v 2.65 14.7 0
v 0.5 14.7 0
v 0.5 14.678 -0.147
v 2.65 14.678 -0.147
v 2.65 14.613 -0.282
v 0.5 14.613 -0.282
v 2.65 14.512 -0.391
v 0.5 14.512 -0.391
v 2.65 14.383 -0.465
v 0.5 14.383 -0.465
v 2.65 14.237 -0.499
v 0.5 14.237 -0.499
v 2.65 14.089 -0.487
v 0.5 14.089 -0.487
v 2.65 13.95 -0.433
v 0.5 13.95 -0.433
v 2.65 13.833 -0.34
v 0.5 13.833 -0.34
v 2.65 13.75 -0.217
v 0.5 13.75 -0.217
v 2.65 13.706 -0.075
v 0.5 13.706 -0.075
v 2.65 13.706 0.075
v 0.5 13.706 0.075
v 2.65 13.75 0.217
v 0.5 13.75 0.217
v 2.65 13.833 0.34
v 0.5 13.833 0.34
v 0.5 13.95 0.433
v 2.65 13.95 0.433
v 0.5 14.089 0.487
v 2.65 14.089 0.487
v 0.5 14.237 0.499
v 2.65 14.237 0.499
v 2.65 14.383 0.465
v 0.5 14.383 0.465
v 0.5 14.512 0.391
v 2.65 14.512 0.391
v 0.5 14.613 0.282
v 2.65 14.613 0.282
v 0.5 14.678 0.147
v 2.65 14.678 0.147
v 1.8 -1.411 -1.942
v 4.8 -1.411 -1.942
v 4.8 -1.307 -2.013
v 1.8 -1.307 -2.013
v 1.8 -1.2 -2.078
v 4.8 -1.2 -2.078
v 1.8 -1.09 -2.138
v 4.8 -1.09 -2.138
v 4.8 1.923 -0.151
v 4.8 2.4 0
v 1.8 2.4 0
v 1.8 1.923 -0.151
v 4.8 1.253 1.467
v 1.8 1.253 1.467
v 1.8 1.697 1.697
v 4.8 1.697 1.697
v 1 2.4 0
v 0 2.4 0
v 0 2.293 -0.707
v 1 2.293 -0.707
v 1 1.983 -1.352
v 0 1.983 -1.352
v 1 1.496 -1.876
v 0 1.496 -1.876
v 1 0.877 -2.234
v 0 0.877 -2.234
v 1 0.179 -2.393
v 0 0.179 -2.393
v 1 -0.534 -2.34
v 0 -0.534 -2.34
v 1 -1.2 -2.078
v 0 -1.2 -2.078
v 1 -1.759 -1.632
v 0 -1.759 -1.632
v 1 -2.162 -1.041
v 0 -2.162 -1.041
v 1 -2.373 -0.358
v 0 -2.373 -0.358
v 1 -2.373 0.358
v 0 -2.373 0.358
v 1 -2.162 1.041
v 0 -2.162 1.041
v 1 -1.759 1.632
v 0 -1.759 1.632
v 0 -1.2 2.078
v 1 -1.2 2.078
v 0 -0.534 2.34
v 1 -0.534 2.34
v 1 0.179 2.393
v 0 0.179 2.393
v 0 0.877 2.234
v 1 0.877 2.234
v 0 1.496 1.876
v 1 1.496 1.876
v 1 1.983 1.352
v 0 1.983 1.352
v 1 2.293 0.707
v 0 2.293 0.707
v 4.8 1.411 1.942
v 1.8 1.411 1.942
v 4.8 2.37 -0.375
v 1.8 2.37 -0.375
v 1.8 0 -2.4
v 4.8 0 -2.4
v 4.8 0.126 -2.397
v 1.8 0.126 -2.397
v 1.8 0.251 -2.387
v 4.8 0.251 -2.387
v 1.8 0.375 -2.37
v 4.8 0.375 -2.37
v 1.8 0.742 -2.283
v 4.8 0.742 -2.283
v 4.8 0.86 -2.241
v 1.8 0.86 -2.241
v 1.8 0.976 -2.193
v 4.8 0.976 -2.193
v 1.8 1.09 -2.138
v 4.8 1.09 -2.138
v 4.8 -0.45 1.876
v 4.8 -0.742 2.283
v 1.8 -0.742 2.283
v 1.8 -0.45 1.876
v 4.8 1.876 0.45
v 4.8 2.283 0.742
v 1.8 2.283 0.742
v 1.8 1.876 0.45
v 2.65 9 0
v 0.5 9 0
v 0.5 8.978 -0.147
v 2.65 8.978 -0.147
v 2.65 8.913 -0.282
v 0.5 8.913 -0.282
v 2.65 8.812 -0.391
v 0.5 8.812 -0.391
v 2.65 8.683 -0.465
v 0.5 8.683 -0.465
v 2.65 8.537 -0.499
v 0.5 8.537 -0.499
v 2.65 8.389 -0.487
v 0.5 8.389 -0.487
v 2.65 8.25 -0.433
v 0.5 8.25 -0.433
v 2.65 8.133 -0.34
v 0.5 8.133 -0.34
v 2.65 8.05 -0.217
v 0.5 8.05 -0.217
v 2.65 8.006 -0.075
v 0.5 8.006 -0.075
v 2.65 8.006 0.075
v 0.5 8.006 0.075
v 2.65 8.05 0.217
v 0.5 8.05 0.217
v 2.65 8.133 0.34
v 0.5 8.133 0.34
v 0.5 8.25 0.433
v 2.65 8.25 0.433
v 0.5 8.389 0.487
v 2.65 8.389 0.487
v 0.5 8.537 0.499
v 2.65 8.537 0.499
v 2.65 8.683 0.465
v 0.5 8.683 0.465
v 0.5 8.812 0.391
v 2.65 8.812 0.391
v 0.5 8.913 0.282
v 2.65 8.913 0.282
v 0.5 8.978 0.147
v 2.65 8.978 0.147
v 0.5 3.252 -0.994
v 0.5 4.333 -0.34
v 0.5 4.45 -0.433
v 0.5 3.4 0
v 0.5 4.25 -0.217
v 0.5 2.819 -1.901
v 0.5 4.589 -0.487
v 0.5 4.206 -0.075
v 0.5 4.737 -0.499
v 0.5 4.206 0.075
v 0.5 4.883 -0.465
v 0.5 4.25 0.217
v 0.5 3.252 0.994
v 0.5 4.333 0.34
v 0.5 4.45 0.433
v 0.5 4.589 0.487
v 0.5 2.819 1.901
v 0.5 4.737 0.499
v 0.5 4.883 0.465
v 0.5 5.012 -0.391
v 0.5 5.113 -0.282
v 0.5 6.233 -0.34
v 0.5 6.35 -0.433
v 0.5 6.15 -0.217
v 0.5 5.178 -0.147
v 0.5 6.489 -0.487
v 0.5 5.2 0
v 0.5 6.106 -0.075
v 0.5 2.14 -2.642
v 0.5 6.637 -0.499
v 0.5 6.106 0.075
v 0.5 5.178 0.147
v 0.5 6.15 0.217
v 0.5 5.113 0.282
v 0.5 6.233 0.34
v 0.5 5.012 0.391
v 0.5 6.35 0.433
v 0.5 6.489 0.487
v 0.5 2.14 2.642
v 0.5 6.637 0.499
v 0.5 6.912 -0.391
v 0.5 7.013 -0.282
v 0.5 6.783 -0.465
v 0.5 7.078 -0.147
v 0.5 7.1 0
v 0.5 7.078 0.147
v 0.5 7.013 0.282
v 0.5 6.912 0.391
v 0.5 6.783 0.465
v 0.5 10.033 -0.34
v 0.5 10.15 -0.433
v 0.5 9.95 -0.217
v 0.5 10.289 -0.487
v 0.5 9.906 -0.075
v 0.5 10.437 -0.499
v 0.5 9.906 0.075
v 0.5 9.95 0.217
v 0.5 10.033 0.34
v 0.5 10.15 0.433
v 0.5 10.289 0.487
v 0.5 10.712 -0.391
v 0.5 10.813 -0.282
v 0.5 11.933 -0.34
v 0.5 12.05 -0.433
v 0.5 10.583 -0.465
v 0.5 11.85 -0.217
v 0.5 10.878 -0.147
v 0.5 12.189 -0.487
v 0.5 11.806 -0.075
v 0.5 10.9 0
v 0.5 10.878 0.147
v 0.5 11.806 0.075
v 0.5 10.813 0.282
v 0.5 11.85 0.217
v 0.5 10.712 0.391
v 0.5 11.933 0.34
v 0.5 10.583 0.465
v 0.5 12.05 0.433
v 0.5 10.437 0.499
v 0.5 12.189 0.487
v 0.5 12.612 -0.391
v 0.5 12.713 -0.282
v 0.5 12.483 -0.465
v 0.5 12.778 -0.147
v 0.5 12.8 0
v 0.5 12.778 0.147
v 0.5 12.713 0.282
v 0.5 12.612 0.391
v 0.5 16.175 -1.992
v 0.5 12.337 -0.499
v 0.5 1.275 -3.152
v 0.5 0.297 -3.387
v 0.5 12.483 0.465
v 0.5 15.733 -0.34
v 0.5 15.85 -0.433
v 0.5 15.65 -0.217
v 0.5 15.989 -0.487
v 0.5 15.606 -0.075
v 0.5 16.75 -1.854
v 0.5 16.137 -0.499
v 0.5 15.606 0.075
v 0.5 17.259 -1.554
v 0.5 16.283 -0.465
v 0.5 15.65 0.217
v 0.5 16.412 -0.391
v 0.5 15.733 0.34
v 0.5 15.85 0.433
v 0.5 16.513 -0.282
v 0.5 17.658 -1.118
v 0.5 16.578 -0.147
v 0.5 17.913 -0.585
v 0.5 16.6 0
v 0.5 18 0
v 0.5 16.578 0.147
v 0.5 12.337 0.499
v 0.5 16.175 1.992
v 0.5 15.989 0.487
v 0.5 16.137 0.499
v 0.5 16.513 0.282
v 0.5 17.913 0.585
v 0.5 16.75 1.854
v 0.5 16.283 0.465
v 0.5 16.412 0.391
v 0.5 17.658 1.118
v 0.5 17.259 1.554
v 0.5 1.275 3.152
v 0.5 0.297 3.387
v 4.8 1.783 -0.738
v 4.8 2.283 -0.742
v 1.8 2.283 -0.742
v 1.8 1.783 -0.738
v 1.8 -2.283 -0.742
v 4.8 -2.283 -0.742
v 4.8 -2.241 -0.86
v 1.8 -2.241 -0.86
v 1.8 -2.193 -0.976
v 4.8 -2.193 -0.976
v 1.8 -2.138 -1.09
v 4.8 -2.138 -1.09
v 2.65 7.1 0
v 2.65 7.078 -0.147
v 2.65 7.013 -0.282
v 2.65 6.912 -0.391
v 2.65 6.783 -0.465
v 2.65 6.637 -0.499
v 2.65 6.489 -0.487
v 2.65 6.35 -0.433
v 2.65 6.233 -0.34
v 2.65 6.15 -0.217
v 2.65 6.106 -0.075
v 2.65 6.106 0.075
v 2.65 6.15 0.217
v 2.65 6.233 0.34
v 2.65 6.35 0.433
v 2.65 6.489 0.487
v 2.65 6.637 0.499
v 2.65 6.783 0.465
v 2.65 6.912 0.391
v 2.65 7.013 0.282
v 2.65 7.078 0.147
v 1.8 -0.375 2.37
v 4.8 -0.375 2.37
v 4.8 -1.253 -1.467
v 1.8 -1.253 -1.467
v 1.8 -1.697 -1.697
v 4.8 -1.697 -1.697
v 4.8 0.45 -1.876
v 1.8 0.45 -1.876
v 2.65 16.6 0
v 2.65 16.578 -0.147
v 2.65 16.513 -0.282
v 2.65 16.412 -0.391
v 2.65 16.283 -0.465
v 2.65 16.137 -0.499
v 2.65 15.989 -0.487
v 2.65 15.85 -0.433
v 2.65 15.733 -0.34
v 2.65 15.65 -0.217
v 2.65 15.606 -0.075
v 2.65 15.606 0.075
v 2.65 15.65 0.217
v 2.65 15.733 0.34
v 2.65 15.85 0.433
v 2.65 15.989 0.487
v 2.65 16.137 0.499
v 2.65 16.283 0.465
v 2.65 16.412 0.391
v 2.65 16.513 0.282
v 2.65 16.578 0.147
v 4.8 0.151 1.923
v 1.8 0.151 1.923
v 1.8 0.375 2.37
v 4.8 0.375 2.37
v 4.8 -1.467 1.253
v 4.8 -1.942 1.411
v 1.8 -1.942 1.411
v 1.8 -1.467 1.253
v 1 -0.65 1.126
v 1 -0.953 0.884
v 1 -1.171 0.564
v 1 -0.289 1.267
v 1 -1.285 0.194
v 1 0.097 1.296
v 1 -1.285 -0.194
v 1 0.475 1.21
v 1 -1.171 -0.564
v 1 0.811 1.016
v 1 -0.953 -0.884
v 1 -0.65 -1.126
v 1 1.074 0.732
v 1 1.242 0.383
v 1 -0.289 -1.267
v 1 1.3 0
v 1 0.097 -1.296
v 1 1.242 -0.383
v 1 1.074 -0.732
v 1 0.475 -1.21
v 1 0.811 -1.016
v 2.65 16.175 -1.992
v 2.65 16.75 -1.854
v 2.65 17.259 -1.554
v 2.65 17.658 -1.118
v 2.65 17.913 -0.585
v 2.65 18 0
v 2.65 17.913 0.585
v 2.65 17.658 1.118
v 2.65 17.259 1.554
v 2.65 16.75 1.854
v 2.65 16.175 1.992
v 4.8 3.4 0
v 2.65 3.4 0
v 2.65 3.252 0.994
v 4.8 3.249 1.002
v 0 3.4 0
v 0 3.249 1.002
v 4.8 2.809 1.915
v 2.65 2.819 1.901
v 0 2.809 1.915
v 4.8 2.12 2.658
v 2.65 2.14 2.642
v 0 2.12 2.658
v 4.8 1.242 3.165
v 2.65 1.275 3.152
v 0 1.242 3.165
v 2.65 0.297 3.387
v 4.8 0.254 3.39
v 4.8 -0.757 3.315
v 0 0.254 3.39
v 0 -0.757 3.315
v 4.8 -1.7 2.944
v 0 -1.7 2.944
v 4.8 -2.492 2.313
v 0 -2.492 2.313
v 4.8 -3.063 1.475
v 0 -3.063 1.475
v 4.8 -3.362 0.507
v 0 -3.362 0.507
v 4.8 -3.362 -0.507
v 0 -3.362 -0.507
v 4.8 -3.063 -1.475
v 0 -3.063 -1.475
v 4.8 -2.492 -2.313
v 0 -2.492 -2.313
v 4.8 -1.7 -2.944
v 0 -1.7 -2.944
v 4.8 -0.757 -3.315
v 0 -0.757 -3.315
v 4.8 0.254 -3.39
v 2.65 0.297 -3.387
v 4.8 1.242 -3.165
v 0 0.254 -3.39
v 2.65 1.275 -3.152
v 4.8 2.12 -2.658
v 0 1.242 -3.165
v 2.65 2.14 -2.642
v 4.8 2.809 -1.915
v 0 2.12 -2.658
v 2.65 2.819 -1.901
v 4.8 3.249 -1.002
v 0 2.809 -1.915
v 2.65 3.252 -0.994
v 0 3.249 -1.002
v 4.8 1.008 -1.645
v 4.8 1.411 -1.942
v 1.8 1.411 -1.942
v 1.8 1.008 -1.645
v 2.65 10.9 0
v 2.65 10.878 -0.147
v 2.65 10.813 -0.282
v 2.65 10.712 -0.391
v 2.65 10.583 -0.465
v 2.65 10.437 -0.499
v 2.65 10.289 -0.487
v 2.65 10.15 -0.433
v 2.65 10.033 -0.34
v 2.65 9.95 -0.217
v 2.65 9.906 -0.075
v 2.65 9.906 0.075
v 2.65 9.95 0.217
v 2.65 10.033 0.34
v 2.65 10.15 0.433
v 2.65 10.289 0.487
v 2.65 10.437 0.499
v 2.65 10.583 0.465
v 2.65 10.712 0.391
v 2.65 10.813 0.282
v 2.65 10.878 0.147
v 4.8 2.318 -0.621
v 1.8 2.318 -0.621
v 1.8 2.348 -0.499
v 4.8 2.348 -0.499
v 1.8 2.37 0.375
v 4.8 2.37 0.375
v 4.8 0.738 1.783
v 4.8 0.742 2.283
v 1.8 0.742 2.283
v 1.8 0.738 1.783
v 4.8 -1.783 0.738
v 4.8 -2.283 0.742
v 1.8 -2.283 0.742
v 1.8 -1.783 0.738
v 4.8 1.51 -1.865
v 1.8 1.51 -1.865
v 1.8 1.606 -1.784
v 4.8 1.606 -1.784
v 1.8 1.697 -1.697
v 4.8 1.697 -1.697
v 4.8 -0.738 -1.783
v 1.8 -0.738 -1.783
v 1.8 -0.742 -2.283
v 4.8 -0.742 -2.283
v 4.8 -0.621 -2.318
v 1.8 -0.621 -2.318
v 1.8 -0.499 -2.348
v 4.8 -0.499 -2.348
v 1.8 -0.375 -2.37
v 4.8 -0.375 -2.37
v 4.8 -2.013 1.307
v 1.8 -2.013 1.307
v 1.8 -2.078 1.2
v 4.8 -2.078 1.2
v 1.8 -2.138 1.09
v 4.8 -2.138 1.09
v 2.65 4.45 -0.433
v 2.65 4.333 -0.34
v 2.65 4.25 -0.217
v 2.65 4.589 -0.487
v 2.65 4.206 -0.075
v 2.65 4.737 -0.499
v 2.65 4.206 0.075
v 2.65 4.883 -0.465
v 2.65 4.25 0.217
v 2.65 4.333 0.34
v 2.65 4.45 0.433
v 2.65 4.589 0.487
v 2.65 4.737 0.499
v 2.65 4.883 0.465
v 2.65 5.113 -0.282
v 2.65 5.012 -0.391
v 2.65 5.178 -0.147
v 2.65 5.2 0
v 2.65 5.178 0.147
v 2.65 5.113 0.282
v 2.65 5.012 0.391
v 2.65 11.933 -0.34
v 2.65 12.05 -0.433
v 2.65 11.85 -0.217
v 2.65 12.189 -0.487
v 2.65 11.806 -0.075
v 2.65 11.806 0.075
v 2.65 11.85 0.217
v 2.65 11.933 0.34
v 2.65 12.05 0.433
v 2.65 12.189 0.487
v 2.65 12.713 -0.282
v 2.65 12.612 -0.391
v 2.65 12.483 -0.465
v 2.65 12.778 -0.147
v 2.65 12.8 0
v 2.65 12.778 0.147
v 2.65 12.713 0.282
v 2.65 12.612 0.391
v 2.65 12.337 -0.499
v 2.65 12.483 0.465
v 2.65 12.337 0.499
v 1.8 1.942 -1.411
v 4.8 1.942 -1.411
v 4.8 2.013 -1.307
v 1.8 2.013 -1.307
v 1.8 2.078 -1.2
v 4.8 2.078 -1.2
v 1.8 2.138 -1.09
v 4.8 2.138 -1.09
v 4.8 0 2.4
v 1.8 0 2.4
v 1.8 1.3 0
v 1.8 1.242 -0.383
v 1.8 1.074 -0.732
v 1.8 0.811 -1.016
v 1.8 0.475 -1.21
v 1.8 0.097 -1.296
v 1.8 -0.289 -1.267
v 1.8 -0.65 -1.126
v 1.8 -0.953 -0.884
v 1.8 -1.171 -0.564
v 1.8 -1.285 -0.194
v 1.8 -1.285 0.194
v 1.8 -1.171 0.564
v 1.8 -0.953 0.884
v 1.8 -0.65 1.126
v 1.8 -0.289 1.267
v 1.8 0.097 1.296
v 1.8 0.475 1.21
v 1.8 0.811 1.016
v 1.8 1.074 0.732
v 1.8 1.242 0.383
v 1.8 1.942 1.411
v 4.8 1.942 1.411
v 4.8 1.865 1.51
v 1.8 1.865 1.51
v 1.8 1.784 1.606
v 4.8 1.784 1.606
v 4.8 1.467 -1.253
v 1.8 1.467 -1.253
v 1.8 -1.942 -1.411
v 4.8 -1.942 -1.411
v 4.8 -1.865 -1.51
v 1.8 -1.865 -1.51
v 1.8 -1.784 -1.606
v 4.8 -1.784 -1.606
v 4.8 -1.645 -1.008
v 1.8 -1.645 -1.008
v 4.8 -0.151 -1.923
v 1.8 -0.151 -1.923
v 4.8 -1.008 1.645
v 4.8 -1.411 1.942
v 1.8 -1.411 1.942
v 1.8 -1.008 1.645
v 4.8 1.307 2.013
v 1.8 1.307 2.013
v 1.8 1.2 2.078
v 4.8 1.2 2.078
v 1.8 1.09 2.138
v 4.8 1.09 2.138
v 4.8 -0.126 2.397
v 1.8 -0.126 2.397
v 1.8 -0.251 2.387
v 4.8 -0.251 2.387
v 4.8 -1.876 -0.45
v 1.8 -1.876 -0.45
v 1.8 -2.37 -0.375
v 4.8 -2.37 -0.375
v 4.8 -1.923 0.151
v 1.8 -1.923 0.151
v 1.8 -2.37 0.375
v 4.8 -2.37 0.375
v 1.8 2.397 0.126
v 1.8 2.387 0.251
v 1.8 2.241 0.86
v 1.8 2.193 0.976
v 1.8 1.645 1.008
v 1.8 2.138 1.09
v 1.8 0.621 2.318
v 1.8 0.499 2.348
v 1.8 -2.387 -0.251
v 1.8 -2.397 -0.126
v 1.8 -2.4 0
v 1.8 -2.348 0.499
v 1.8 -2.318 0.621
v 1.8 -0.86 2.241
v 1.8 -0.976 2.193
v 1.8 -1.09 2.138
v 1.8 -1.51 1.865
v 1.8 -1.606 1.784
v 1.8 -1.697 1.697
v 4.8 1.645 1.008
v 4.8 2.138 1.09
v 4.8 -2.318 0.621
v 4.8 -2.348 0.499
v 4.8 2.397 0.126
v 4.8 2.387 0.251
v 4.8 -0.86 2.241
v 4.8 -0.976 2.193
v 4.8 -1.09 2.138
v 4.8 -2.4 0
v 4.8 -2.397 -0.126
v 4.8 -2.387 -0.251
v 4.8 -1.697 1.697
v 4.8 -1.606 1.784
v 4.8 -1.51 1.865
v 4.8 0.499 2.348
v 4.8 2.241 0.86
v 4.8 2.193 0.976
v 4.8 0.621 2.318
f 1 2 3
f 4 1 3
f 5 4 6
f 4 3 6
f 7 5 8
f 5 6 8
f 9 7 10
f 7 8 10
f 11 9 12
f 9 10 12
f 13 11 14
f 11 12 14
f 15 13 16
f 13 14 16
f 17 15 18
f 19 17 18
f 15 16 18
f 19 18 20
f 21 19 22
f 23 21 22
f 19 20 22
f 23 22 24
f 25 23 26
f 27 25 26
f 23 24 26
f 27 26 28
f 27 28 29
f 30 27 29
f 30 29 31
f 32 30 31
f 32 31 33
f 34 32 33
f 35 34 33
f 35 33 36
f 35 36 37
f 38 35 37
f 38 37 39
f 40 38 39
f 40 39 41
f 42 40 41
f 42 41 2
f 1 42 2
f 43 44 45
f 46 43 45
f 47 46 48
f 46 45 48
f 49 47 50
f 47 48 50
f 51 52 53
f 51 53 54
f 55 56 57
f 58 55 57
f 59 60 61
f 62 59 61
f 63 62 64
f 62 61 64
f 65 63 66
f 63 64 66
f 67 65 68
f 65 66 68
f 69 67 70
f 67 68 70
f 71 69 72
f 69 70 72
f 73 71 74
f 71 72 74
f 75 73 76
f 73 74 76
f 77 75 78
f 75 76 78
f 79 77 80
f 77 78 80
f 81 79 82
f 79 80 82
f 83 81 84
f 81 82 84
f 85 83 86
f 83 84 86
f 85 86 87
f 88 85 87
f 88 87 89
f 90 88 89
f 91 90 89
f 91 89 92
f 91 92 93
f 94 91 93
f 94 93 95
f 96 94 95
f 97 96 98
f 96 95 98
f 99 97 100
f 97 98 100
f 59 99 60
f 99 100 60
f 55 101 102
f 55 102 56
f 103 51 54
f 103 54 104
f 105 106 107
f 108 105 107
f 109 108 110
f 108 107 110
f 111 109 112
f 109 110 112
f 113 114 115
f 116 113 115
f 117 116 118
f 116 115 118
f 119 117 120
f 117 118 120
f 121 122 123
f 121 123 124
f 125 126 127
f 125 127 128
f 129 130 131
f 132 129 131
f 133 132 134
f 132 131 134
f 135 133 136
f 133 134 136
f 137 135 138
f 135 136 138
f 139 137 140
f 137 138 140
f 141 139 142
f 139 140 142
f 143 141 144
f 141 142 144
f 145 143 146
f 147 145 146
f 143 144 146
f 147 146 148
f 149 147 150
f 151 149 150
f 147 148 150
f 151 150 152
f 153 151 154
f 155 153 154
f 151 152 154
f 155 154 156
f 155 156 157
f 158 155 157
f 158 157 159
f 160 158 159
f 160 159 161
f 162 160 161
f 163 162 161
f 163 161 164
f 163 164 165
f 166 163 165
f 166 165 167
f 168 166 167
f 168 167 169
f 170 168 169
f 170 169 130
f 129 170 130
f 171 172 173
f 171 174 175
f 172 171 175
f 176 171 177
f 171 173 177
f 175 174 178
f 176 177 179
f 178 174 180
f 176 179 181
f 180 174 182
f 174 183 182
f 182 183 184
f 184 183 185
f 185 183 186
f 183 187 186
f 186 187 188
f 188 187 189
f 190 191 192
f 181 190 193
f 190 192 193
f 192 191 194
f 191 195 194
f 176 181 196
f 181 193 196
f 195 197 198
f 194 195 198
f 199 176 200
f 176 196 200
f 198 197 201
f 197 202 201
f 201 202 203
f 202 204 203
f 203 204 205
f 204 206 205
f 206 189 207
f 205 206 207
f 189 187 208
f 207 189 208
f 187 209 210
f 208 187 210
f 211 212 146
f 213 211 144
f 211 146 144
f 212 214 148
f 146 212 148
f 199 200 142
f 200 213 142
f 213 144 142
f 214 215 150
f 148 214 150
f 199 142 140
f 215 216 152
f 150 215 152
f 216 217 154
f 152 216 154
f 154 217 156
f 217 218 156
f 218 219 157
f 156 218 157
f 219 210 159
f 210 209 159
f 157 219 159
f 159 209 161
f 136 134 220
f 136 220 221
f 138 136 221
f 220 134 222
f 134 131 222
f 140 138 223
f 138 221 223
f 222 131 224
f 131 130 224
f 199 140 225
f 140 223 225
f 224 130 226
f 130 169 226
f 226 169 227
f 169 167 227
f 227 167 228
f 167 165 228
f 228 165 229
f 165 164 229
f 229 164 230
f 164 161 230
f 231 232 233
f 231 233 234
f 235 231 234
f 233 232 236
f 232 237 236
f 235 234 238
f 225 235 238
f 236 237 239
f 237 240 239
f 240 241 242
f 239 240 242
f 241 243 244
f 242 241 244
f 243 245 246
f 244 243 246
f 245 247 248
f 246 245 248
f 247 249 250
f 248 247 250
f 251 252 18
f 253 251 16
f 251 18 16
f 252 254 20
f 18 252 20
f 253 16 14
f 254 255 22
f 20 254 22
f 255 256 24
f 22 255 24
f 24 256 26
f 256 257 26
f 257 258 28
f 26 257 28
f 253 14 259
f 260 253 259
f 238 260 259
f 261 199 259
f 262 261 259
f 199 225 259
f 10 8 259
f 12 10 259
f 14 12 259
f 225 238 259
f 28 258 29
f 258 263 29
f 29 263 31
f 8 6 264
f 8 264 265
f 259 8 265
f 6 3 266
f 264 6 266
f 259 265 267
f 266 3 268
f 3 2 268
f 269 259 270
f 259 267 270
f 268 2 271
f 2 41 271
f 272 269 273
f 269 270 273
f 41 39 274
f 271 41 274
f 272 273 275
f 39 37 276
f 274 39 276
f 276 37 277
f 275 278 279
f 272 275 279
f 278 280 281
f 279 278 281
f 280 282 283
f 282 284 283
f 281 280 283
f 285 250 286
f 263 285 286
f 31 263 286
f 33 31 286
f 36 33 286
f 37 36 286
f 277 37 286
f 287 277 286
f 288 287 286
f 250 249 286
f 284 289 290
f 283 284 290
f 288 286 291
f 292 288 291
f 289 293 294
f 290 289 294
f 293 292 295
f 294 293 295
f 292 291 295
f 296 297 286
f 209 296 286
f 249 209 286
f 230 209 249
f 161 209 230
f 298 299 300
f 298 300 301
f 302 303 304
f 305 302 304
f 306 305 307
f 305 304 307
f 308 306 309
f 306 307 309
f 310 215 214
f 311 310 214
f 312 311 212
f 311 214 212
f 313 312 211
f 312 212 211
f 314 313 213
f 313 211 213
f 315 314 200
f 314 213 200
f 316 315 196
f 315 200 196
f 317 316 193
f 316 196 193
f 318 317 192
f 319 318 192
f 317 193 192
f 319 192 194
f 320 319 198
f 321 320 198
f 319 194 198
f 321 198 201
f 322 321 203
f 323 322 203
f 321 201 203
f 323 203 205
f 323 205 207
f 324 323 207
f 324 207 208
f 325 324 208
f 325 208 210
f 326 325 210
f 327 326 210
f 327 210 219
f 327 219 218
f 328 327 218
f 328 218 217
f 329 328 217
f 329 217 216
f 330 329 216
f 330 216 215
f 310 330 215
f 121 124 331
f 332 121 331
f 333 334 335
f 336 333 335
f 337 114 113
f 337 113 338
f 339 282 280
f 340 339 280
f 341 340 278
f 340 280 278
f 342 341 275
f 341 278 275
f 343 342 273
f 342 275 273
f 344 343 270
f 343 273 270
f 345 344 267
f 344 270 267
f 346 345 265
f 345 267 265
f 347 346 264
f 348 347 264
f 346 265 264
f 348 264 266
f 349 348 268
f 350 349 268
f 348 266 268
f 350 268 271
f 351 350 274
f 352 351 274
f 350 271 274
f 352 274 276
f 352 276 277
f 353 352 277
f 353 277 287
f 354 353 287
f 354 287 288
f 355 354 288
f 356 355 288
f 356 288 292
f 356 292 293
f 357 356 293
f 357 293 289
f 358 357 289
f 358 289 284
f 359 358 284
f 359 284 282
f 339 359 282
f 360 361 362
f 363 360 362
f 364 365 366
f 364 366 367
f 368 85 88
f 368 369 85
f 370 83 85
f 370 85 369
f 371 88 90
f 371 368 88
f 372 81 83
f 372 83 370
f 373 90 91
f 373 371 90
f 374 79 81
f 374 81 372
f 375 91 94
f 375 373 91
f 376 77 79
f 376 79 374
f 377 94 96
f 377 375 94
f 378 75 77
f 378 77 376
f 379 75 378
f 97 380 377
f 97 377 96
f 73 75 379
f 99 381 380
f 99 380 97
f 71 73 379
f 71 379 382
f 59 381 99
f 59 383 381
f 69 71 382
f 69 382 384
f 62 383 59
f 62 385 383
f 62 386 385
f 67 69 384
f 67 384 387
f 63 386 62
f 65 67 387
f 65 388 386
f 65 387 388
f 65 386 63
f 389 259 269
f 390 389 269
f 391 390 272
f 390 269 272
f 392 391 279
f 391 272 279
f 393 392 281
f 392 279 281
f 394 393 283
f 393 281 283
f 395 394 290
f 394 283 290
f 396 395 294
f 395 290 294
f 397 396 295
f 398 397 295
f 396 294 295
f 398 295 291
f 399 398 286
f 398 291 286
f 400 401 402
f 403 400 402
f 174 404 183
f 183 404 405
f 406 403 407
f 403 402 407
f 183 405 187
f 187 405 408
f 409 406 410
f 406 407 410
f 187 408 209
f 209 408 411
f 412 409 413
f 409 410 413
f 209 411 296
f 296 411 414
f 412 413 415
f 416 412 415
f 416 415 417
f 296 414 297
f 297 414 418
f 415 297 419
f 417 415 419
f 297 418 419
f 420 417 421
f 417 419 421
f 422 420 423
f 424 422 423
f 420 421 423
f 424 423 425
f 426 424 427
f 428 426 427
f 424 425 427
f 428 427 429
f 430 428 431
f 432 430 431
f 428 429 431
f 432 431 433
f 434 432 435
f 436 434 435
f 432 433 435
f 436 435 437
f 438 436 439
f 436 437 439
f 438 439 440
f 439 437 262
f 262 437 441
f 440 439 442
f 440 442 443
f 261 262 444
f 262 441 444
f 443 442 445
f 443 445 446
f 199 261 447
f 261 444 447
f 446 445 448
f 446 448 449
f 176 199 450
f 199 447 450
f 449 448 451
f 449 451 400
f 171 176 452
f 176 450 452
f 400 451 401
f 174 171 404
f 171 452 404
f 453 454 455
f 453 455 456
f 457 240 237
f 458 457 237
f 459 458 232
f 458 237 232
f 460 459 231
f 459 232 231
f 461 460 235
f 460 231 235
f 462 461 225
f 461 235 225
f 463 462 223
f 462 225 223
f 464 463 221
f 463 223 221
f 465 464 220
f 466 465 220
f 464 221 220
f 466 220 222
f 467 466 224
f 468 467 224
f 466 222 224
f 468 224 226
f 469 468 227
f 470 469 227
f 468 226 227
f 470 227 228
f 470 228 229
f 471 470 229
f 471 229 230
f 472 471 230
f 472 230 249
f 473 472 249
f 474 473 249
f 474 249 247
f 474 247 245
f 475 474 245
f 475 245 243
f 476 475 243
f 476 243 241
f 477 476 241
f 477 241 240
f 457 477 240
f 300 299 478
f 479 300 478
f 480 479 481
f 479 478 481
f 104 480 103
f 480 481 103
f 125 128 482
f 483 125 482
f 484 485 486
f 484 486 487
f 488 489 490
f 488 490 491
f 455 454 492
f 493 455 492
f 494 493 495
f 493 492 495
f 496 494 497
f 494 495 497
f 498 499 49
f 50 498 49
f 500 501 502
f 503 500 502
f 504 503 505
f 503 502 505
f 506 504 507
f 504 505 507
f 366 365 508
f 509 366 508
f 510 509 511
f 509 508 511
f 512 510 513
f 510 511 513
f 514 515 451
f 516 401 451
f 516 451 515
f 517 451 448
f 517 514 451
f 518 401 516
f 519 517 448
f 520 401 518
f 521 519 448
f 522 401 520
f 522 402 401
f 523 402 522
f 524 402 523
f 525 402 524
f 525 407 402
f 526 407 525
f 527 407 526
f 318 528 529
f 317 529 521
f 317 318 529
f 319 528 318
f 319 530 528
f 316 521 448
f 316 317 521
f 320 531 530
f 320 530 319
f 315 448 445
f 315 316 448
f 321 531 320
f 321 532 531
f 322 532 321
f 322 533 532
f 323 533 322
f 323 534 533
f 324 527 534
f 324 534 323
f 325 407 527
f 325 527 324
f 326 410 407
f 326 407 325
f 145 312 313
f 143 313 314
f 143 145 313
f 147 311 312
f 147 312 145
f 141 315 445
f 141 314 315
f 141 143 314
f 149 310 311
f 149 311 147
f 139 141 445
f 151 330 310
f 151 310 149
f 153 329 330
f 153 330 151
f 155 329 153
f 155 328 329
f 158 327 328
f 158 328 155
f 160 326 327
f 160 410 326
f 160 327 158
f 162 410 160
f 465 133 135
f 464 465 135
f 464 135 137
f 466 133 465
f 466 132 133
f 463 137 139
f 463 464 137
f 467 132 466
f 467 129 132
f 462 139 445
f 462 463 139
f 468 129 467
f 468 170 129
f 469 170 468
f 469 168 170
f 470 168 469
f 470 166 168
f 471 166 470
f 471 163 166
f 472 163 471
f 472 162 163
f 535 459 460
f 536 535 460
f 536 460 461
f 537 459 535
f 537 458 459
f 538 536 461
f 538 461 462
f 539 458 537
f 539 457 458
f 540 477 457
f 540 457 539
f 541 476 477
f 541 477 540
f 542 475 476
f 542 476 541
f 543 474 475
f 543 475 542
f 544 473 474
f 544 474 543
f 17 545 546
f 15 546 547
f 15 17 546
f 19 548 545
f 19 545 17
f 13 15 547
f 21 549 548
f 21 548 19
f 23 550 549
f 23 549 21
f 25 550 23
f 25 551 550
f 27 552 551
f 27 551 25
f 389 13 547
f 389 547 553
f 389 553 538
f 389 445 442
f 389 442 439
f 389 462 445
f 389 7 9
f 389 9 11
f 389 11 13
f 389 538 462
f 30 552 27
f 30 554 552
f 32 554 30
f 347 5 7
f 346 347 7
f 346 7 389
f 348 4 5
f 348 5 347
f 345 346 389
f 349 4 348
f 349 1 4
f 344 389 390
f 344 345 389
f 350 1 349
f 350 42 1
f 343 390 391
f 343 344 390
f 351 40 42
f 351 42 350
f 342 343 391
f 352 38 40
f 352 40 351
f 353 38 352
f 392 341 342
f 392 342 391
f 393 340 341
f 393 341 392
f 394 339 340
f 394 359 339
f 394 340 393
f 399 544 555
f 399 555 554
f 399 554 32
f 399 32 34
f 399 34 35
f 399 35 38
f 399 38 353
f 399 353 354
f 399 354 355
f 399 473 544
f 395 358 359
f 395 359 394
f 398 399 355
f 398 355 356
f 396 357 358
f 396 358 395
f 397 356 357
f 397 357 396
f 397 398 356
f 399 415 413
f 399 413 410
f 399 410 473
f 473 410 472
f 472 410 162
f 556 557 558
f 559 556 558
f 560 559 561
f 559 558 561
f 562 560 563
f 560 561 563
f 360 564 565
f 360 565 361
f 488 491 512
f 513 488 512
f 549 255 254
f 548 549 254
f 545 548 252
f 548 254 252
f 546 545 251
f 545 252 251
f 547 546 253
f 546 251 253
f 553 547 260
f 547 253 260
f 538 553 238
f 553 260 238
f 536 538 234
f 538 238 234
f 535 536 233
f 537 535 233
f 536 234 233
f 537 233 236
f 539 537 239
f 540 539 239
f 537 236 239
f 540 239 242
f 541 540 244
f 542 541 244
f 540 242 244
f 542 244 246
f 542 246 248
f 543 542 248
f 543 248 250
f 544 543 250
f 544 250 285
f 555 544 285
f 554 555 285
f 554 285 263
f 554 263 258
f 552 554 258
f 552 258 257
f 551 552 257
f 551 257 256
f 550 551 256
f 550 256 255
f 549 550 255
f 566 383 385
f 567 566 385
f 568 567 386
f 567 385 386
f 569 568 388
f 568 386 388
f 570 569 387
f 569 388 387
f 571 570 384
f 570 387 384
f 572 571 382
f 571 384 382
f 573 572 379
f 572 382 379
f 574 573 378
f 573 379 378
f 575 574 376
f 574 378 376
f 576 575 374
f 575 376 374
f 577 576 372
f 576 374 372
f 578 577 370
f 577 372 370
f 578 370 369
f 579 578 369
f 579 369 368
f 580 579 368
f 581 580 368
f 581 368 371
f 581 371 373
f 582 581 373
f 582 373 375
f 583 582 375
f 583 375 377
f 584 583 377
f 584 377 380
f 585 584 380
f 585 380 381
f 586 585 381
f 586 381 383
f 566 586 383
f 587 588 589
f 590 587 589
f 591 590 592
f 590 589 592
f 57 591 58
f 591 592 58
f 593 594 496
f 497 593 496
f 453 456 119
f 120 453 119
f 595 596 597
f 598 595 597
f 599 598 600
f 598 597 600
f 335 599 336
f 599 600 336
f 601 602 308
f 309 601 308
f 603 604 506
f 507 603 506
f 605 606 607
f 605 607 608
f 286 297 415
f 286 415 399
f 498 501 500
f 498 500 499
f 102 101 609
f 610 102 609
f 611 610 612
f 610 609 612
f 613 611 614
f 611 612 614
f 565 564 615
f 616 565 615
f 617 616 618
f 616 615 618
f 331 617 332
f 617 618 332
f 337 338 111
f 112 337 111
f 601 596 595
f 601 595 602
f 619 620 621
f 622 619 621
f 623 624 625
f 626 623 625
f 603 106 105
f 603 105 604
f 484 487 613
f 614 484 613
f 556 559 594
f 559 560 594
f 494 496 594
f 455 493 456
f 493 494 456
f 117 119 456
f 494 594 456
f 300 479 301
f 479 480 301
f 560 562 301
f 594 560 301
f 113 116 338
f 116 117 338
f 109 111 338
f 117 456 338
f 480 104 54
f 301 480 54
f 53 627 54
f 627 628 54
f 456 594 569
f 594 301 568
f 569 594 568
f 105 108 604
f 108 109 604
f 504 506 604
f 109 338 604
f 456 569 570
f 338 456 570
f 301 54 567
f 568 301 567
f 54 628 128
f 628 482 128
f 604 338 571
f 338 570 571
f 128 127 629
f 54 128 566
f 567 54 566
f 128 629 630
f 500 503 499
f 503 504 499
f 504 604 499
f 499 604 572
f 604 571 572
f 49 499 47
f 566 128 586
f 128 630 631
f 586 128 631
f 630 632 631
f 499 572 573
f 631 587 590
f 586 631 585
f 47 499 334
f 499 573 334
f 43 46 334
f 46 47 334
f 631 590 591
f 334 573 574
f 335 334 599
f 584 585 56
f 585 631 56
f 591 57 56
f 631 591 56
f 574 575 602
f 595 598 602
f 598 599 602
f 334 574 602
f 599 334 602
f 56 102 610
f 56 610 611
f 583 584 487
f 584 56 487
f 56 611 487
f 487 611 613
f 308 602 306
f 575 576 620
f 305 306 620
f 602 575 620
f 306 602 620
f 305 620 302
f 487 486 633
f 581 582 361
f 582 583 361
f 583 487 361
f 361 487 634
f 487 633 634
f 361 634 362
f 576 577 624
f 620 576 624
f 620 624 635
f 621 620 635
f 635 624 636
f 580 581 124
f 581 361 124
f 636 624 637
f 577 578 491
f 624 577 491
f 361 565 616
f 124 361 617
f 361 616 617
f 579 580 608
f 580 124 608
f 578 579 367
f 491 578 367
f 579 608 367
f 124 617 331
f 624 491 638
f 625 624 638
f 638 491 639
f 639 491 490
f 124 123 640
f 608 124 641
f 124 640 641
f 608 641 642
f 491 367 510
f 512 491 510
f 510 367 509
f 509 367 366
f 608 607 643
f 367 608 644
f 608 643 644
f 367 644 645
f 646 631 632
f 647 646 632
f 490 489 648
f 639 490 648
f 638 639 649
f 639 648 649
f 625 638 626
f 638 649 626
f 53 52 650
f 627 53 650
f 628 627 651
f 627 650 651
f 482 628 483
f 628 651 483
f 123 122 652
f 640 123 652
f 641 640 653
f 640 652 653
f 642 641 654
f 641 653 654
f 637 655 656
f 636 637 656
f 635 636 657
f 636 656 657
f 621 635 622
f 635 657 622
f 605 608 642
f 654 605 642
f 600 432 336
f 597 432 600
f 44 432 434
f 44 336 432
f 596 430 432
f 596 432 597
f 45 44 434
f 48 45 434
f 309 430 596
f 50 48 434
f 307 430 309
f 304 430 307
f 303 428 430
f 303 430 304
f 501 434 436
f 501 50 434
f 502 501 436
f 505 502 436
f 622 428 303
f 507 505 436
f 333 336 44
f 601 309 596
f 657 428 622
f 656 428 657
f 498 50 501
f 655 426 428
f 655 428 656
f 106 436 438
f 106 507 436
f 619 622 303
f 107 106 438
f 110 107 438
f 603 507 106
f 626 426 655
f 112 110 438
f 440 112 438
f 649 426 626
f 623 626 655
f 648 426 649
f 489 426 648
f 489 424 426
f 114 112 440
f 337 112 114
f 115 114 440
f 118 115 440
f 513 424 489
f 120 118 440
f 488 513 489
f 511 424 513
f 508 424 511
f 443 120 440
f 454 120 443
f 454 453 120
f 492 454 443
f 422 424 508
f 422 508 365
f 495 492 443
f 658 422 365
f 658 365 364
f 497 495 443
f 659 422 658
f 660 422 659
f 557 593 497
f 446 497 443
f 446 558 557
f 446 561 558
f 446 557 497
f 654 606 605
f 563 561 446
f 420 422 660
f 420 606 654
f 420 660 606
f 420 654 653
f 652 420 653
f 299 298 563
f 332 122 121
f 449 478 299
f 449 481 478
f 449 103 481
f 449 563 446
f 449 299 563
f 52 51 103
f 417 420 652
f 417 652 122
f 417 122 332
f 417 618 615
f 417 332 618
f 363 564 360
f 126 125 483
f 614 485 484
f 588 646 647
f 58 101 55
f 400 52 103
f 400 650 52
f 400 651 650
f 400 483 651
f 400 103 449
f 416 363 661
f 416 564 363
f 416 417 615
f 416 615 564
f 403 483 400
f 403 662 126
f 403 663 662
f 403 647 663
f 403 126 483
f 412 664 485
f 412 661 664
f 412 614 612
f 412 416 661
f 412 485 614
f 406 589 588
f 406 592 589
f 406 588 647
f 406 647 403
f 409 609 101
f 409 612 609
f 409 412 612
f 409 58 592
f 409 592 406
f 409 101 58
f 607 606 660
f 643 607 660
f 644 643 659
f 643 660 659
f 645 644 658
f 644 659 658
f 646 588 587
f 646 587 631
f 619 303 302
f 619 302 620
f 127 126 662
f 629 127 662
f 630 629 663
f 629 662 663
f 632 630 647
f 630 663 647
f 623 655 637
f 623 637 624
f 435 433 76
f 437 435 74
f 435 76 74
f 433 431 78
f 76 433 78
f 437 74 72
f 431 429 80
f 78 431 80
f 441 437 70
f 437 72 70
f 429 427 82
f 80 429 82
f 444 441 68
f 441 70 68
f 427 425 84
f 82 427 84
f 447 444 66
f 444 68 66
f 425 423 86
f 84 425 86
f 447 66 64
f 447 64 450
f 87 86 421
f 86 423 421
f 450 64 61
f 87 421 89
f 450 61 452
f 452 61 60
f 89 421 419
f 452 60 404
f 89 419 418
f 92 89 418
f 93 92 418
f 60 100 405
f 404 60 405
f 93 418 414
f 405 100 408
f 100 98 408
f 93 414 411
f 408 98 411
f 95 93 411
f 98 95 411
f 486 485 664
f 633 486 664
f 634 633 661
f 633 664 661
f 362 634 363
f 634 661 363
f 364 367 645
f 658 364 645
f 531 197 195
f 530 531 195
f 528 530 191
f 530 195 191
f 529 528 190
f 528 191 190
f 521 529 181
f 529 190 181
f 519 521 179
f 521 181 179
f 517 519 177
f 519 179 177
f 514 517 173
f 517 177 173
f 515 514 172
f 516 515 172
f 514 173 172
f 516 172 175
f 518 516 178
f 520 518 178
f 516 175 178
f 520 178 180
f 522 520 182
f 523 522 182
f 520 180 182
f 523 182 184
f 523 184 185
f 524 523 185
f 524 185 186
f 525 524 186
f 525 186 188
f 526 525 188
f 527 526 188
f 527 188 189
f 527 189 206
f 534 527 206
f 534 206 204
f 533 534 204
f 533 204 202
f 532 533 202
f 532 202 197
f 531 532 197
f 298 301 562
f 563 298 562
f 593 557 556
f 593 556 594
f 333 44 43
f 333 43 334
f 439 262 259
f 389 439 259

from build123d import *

# Parameters (mm, degrees)
SKETCH079_R        = 3.4
PAD047_DEPTH       = 4.8
PAD048_DEPTH       = 2.15
POCKET033_DEPTH    = 3
POLARPATTERN_COUNT = 20
SKETCH082_R        = 2.4
POCKET034_DEPTH    = 1
SKETCH083_R        = 1.3
POCKET035_DEPTH    = 5
SKETCH084_R        = 0.5
POCKET036_DEPTH    = 5


with BuildPart() as part:
    # Sketch079 → Pad047 (new body)
    with BuildSketch(Plane.YZ):
        Circle(SKETCH079_R)
    extrude(amount=PAD047_DEPTH)

    # Sketch080 → Pad048 (join)
    with BuildSketch(Plane.YZ.offset(0.5)):
        with BuildLine():
            ThreePointArc((16.175, -1.9923290391), (18, 0), (16.175, 1.9923290391))
            Line((0.2975, 3.3869593665), (16.175, 1.9923290391))
            ThreePointArc((0.2975, 3.3869593665), (-3.4, 0), (0.2975, -3.3869593665))
            Line((0.2975, -3.3869593665), (16.175, -1.9923290391))
        make_face()
    extrude(amount=PAD048_DEPTH)

    # Sketch081 (on Face10 of Pad048) → Pocket033 (cut)
    with BuildSketch(Plane.YZ.offset(4.8)):
        with BuildLine():
            Line((2.4, 0), (1.9234666187, -0.1513801059))
            Line((1.9234666187, -0.1513801059), (2.3704520174, -0.3754427161))
            Line((0, 0), (2.3704520174, -0.3754427161))
            Line((2.3704520174, 0.3754427161), (0, 0))
            ThreePointArc((2.4, 0), (2.392601601, 0.1883018297), (2.3704520174, 0.3754427161))
        make_face()
    pocket033 = extrude(amount=-POCKET033_DEPTH, mode=Mode.SUBTRACT)

    # PolarPattern: Pocket033 ×20 about axis
    polarpattern_axis = Axis((4.8, 0, 0), (1, 0, 0))
    for i in range(1, POLARPATTERN_COUNT):
        add(pocket033.rotate(polarpattern_axis, i * 360 / POLARPATTERN_COUNT), mode=Mode.SUBTRACT)

    # Sketch082 (on Face2 of PolarPattern) → Pocket034 (cut)
    with BuildSketch(Plane(origin=(0, 0, 0), x_dir=(0, 1, 0), z_dir=(-1, 0, 0))):
        Circle(SKETCH082_R)
    extrude(amount=-POCKET034_DEPTH, mode=Mode.SUBTRACT)

    # Sketch083 (on Face10 of Pocket034) → Pocket035 (cut)
    with BuildSketch(Plane(origin=(1, 0, 0), x_dir=(0, 1, 0), z_dir=(-1, 0, 0))):
        Circle(SKETCH083_R)
    extrude(amount=-POCKET035_DEPTH, mode=Mode.SUBTRACT)

    # Sketch084 (on Face3 of Pocket035) → Pocket036 (cut)
    with BuildSketch(Plane(origin=(0.5, 0, 0), x_dir=(0, 1, 0), z_dir=(-1, 0, 0))):
        with Locations((4.7, 0)):
            Circle(SKETCH084_R)
        with Locations((6.6, 0)):
            Circle(SKETCH084_R)
        with Locations((8.5, 0)):
            Circle(SKETCH084_R)
        with Locations((10.4, 0)):
            Circle(SKETCH084_R)
        with Locations((12.3, 0)):
            Circle(SKETCH084_R)
        with Locations((14.2, 0)):
            Circle(SKETCH084_R)
        with Locations((16.1, 0)):
            Circle(SKETCH084_R)
    extrude(amount=-POCKET036_DEPTH, mode=Mode.SUBTRACT)


solid = part.part
